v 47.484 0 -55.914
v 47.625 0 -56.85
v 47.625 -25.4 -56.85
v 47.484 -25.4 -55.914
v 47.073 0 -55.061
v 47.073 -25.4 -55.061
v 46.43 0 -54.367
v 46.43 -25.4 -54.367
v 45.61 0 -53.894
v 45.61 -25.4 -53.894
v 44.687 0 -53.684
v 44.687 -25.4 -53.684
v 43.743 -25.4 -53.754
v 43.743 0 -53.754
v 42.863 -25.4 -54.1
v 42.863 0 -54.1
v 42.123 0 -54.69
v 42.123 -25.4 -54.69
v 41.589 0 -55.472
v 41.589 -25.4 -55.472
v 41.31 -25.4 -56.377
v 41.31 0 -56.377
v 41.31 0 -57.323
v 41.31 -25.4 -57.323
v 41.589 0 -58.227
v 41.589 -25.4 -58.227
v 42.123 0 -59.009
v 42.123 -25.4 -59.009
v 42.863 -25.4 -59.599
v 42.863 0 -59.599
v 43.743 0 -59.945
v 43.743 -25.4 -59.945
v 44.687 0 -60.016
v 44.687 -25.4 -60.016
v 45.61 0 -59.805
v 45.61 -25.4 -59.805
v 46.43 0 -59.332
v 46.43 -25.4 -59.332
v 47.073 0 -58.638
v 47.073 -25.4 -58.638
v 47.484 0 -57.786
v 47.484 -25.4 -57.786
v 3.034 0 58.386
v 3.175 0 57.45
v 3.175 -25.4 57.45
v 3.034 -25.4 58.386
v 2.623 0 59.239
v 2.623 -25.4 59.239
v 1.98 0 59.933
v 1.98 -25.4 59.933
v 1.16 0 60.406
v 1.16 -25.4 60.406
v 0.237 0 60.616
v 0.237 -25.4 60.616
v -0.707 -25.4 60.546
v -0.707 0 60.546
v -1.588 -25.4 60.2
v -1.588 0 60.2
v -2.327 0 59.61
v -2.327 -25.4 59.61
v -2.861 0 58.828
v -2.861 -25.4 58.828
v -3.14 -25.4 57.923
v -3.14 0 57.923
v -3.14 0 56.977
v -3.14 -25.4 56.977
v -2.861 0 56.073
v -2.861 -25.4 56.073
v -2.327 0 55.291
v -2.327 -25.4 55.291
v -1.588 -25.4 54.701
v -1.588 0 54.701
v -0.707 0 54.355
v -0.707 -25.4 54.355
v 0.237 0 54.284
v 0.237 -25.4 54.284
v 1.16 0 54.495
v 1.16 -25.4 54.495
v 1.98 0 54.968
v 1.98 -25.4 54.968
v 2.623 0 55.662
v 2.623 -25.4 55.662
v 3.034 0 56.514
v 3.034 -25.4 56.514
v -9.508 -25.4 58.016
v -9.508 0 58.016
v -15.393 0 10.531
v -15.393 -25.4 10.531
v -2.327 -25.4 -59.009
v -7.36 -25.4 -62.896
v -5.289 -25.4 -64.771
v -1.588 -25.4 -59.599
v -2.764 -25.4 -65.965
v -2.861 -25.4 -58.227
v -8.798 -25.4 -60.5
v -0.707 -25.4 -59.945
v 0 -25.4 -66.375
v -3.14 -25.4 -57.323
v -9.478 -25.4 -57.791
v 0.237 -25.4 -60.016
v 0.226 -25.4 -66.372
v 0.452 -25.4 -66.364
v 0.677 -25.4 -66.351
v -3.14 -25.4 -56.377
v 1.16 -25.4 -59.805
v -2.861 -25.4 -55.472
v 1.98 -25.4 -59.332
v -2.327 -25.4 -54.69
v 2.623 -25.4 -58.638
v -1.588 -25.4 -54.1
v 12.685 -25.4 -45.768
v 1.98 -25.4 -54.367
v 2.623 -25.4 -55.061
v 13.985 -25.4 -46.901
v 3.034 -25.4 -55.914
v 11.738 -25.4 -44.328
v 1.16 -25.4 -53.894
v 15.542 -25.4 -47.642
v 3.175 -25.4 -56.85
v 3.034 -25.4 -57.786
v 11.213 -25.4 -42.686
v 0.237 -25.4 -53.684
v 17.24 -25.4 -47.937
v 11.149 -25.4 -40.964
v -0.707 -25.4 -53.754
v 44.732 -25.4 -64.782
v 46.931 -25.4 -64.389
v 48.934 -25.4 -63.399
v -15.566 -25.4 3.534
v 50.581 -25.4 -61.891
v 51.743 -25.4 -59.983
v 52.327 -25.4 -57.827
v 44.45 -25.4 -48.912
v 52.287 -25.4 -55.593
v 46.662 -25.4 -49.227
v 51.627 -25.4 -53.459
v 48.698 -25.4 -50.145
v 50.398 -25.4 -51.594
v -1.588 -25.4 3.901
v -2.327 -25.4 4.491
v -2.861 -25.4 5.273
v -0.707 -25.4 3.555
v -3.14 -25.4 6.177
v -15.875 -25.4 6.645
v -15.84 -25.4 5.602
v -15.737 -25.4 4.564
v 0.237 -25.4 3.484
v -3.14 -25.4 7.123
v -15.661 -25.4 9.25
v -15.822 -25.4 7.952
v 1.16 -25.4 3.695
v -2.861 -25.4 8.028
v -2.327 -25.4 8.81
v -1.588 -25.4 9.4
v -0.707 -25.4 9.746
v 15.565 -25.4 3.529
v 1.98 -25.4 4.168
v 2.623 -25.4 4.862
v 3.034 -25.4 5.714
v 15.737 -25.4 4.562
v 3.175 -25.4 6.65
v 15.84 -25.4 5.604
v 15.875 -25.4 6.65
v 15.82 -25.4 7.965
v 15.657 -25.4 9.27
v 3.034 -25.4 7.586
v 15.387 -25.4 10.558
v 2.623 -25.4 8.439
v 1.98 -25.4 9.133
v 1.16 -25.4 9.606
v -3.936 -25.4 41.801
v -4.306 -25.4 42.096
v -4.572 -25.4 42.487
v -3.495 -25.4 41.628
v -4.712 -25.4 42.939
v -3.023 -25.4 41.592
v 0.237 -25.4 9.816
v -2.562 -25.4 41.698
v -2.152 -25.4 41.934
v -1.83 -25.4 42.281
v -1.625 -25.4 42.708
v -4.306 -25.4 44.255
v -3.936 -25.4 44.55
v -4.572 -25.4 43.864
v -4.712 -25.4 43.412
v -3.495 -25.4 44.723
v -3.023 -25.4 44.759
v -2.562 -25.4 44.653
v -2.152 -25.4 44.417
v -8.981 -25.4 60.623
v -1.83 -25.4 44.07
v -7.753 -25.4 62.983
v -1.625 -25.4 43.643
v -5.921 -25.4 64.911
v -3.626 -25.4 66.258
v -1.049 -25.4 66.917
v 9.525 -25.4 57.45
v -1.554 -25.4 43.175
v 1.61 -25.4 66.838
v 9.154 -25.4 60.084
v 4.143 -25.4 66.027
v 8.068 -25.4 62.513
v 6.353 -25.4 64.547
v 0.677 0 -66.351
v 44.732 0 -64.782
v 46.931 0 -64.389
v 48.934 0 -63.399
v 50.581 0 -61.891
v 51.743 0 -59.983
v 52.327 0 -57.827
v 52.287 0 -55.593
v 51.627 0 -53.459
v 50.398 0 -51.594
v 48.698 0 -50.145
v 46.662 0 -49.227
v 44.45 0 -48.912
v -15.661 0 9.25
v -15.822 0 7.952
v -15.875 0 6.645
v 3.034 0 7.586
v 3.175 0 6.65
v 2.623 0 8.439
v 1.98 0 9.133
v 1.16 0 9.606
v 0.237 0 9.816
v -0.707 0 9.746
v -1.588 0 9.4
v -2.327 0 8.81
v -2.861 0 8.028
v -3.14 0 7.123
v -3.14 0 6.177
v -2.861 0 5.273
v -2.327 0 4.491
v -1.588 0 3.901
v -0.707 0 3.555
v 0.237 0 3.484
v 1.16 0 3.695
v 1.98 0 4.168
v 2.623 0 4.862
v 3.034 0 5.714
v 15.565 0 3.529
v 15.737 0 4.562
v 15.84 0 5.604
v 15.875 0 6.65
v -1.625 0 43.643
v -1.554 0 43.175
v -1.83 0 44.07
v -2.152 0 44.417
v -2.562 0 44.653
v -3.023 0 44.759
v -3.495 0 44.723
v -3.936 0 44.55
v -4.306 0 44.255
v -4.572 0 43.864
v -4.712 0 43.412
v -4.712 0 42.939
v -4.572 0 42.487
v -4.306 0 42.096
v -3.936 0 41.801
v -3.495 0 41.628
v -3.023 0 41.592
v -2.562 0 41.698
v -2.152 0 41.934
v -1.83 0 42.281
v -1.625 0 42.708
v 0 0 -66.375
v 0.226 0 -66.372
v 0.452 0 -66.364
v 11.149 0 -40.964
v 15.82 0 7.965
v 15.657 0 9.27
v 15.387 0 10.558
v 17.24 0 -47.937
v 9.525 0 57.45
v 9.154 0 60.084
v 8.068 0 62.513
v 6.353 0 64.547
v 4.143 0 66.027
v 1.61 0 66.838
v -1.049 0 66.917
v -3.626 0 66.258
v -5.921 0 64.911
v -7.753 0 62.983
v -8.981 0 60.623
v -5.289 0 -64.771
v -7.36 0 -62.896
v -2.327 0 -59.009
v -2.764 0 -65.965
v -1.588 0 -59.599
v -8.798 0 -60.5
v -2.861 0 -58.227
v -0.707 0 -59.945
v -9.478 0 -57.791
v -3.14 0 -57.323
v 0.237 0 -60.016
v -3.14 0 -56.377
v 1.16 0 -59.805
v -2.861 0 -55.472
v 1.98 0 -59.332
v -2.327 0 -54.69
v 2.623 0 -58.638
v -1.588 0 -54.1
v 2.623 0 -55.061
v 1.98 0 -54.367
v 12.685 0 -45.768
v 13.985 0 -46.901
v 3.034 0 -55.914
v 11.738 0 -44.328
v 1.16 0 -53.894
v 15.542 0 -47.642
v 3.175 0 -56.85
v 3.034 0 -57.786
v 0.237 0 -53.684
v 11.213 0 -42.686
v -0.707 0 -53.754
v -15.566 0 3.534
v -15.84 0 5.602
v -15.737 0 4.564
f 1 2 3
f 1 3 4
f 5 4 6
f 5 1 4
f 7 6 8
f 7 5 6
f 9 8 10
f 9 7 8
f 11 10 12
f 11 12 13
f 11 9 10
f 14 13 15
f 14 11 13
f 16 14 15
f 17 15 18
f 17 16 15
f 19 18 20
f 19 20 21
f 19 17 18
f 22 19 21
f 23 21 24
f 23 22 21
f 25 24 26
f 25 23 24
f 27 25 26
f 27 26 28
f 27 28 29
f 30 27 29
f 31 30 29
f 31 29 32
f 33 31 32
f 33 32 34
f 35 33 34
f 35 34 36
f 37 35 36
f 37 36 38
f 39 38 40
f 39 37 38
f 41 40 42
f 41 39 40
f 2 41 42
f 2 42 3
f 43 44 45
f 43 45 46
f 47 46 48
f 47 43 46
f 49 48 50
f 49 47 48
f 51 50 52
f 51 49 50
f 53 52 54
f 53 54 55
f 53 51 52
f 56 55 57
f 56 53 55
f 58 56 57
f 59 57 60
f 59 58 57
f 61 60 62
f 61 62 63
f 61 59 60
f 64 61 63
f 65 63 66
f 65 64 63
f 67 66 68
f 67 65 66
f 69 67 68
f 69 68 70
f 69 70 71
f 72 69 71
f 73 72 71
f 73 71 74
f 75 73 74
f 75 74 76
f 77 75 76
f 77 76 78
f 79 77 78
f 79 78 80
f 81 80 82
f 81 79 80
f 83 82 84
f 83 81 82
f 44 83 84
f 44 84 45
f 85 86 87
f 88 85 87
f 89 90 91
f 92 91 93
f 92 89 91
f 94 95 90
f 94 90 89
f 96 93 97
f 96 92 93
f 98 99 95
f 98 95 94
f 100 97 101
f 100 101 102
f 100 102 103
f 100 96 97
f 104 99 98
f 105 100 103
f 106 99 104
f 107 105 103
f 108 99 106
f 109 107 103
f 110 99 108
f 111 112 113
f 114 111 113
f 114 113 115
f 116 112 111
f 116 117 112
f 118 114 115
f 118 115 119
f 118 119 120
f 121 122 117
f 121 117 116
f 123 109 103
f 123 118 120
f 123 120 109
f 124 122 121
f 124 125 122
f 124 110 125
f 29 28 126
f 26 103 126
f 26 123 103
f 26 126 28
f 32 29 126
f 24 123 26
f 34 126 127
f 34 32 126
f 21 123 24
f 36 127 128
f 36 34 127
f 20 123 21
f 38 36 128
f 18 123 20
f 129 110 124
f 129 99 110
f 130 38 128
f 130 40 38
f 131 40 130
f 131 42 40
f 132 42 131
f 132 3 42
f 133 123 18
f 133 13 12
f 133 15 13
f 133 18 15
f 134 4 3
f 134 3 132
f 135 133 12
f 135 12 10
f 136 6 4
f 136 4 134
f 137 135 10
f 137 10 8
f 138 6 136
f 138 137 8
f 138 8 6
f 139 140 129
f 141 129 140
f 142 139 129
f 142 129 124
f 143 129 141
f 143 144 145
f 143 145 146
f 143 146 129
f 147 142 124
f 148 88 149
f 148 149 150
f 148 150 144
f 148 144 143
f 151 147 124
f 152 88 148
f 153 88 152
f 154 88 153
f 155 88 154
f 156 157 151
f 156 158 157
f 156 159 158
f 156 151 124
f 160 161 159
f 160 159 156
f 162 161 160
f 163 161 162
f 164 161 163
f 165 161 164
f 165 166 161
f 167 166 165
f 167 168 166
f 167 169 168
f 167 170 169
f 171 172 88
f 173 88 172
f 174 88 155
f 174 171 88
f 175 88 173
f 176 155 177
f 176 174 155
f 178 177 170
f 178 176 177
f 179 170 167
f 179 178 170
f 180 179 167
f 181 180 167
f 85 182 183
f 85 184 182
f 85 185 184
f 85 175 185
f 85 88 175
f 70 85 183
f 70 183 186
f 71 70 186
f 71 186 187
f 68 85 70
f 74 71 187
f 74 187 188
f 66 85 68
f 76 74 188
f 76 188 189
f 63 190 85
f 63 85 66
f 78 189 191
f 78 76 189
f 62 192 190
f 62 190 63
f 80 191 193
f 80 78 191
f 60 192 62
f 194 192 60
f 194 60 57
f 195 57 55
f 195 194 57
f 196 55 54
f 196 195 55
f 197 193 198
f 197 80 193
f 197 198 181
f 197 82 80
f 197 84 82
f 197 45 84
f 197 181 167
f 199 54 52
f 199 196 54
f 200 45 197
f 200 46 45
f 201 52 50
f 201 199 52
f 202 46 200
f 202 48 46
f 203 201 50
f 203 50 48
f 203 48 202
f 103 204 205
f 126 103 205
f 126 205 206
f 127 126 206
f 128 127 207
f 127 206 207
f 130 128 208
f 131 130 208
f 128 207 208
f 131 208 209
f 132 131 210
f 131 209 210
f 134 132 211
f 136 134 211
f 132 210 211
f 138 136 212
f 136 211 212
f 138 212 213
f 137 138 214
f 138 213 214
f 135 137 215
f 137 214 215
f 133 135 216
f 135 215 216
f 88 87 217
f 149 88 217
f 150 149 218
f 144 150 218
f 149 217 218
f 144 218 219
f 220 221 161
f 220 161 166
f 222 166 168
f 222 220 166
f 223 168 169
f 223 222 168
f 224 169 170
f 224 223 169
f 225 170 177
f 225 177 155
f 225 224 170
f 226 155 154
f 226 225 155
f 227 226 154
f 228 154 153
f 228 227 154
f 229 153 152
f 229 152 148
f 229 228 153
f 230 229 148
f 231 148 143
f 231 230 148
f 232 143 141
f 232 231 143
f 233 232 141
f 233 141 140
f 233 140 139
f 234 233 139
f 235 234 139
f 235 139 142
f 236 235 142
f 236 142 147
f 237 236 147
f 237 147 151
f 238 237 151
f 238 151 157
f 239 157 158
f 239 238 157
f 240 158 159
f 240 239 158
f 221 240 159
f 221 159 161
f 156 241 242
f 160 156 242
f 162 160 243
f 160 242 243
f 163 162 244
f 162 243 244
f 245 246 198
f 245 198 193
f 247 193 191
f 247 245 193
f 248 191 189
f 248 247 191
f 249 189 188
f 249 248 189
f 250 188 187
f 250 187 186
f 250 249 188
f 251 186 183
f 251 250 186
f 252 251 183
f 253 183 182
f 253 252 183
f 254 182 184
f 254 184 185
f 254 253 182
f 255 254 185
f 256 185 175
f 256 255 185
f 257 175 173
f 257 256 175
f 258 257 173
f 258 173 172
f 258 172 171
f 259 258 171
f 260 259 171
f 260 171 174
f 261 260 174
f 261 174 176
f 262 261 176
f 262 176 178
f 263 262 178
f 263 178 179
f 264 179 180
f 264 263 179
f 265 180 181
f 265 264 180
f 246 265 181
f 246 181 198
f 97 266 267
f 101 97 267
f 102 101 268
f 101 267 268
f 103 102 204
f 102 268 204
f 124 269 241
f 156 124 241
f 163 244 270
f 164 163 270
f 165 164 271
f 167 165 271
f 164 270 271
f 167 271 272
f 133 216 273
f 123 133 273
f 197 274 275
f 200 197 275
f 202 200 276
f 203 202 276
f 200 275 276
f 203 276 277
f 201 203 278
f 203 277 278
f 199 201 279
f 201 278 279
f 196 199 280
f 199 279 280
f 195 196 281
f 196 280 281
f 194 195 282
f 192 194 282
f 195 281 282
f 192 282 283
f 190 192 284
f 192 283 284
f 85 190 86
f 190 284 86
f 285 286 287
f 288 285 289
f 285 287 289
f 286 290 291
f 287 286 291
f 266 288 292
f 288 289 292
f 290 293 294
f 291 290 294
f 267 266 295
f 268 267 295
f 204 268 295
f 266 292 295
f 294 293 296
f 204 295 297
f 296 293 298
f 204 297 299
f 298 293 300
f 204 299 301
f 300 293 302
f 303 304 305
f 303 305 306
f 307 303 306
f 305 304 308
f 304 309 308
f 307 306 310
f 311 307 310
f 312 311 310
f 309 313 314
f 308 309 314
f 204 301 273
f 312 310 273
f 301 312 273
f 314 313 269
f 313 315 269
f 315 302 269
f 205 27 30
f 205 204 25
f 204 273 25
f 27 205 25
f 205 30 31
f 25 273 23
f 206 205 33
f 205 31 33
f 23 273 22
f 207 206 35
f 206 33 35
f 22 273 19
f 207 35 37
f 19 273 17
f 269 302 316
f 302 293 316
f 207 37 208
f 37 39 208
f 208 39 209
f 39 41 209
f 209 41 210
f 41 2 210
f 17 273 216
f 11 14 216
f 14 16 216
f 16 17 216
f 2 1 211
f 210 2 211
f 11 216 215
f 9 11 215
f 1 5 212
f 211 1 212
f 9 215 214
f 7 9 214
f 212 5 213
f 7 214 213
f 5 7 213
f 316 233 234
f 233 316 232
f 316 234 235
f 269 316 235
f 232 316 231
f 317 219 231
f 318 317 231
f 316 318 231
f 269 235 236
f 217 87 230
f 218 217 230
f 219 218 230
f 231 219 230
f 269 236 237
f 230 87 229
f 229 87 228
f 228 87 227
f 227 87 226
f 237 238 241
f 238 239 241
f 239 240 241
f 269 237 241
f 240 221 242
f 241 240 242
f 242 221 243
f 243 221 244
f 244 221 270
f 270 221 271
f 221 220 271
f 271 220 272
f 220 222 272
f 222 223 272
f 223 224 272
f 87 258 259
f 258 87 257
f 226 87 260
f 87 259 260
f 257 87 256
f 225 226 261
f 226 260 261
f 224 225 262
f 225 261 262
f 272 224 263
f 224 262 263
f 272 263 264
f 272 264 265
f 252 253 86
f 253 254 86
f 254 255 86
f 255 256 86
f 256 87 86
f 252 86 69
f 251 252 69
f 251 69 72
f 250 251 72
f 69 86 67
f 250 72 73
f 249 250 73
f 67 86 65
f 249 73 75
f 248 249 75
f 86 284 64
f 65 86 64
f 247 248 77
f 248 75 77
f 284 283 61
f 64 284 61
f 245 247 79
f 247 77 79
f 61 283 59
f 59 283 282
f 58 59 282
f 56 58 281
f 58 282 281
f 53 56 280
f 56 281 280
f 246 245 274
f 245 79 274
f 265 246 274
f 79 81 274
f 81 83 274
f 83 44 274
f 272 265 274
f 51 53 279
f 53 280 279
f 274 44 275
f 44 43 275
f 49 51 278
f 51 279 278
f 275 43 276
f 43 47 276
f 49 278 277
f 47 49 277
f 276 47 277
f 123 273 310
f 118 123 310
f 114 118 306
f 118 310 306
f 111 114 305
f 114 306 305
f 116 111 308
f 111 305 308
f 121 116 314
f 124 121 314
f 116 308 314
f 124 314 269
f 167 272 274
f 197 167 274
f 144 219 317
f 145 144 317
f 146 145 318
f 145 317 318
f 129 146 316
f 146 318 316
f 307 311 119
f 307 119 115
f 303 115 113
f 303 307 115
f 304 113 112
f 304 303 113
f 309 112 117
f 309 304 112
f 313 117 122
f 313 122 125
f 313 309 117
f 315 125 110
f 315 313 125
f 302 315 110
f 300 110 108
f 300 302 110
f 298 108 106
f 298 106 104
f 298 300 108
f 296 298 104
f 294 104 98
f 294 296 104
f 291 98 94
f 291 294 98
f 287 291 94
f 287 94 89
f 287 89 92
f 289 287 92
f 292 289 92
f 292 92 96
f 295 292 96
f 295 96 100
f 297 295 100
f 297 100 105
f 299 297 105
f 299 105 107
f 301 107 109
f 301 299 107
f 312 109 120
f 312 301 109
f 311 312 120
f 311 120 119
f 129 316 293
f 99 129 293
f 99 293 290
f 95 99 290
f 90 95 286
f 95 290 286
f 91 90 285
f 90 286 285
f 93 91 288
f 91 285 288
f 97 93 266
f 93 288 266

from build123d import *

# Parameters (mm, degrees)
F0_R     = 3.175
F0_R_2   = 1.5875
F1_DEPTH = 25.4


with BuildPart() as f1:
    # F0 (on Front) → F1 (new body)
    with BuildSketch(Plane.XZ):
        with BuildLine():
            ThreePointArc((-9.5081937086, 58.0158391523), (-0.2829133485, 47.9294646022), (9.525, 57.4502621022))
            ThreePointArc((9.525, 57.4502621022), (0.2829133485, 66.9710596023), (-9.5081937086, 58.0158391523))
        make_face()
        with Locations((0, 57.4502621022)):
            Circle(F0_R, mode=Mode.SUBTRACT)
        with BuildLine():
            Line((15.3865384615, 10.5579544099), (9.525, 57.4502621022))
            ThreePointArc((9.525, 57.4502621022), (-0.2829133485, 47.9294646022), (-9.5081937086, 58.0158391523))
            Line((-9.5081937086, 58.0158391523), (-15.393400304, 10.5308357814))
            ThreePointArc((-15.393400304, 10.5308357814), (-0.0139866445, 22.5252559408), (15.3865384615, 10.5579544099))
        make_face()
        with Locations((-3.1419943552, 43.1754621022)):
            Circle(F0_R_2, mode=Mode.SUBTRACT)
        with BuildLine():
            Line((15.875, 6.6502621022), (15.3865384615, 10.5579544099))
            ThreePointArc((15.3865384615, 10.5579544099), (-0.0139866445, 22.5252559408), (-15.393400304, 10.5308357814))
            Line((-15.393400304, 10.5308357814), (-15.8749991405, 6.6450380613))
            Line((-15.8749991405, 6.6450380613), (-15.5661926872, 3.5342919124))
            ThreePointArc((-15.5661926872, 3.5342919124), (-0.002485721, -9.2247377032), (15.5652161214, 3.5294173299))
            Line((15.5652161214, 3.5294173299), (15.875, 6.6502621022))
        make_face()
        with Locations((0, 6.6502621022)):
            Circle(F0_R, mode=Mode.SUBTRACT)
        with BuildLine():
            ThreePointArc((15.875, 6.6502621022), (15.7524112928, 8.6193135138), (15.3865384615, 10.5579544099))
            Line((15.3865384615, 10.5579544099), (15.875, 6.6502621022))
        make_face()
        with BuildLine():
            Line((-15.8749991405, 6.6450380613), (-15.393400304, 10.5308357814))
            ThreePointArc((-15.393400304, 10.5308357814), (-15.754461493, 8.6028419507), (-15.8749991405, 6.6450380613))
        make_face()
        with BuildLine():
            ThreePointArc((15.5652161214, 3.5294173299), (15.7973641936, 5.0821710538), (15.875, 6.6502621022))
            Line((15.875, 6.6502621022), (15.5652161214, 3.5294173299))
        make_face()
        with BuildLine():
            Line((-15.5661926872, 3.5342919124), (-15.8749991405, 6.6450380613))
            ThreePointArc((-15.8749991405, 6.6450380613), (-15.7973517175, 5.0820453721), (-15.5661926872, 3.5342919124))
        make_face()
        with BuildLine():
            Line((11.1487181344, -40.9635521522), (15.5652161214, 3.5294173299))
            ThreePointArc((15.5652161214, 3.5294173299), (-0.002485721, -9.2247377032), (-15.5661926872, 3.5342919124))
            Line((-15.5661926872, 3.5342919124), (-9.4784110305, -57.7906679359))
            ThreePointArc((-9.4784110305, -57.7906679359), (-0.4710413646, -47.33639227), (9.525, -56.8497378978))
            ThreePointArc((9.525, -56.8497378978), (6.9705567315, -63.341036986), (0.6773435479, -66.3506236838))
            Line((0.6773435479, -66.3506236838), (44.7324052746, -64.7822125124))
            ThreePointArc((44.7324052746, -64.7822125124), (36.5137564458, -56.9909628899), (44.45, -48.9122378978))
            Line((44.45, -48.9122378978), (17.2401500444, -47.9367114742))
            ThreePointArc((17.2401500444, -47.9367114742), (12.6853766448, -45.7683751299), (11.1487181344, -40.9635521522))
        make_face()
        with BuildLine():
            ThreePointArc((9.525, -56.8497378978), (-0.4710413646, -47.33639227), (-9.4784110305, -57.7906679359))
            ThreePointArc((-9.4784110305, -57.7906679359), (-6.393874662, -63.9097656461), (0, -66.3747378978))
            Line((0, -66.3747378978), (0.6773435479, -66.3506236838))
            ThreePointArc((0.6773435479, -66.3506236838), (6.9705567315, -63.341036986), (9.525, -56.8497378978))
        make_face()
        with Locations((0, -56.8497378978)):
            Circle(F0_R, mode=Mode.SUBTRACT)
        with BuildLine():
            Line((0.6773435479, -66.3506236838), (0, -66.3747378978))
            ThreePointArc((0, -66.3747378978), (0.3388863295, -66.3687074353), (0.6773435479, -66.3506236838))
        make_face()
        with BuildLine():
            ThreePointArc((52.3875, -56.8497378978), (50.0626600757, -51.2370778221), (44.45, -48.9122378978))
            ThreePointArc((44.45, -48.9122378978), (36.5137564458, -56.9909628899), (44.7324052746, -64.7822125124))
            ThreePointArc((44.7324052746, -64.7822125124), (50.1616327839, -62.3616483825), (52.3875, -56.8497378978))
        make_face()
        with Locations((44.45, -56.8497378978)):
            Circle(F0_R, mode=Mode.SUBTRACT)
    extrude(amount=F1_DEPTH)


solid = f1.part
